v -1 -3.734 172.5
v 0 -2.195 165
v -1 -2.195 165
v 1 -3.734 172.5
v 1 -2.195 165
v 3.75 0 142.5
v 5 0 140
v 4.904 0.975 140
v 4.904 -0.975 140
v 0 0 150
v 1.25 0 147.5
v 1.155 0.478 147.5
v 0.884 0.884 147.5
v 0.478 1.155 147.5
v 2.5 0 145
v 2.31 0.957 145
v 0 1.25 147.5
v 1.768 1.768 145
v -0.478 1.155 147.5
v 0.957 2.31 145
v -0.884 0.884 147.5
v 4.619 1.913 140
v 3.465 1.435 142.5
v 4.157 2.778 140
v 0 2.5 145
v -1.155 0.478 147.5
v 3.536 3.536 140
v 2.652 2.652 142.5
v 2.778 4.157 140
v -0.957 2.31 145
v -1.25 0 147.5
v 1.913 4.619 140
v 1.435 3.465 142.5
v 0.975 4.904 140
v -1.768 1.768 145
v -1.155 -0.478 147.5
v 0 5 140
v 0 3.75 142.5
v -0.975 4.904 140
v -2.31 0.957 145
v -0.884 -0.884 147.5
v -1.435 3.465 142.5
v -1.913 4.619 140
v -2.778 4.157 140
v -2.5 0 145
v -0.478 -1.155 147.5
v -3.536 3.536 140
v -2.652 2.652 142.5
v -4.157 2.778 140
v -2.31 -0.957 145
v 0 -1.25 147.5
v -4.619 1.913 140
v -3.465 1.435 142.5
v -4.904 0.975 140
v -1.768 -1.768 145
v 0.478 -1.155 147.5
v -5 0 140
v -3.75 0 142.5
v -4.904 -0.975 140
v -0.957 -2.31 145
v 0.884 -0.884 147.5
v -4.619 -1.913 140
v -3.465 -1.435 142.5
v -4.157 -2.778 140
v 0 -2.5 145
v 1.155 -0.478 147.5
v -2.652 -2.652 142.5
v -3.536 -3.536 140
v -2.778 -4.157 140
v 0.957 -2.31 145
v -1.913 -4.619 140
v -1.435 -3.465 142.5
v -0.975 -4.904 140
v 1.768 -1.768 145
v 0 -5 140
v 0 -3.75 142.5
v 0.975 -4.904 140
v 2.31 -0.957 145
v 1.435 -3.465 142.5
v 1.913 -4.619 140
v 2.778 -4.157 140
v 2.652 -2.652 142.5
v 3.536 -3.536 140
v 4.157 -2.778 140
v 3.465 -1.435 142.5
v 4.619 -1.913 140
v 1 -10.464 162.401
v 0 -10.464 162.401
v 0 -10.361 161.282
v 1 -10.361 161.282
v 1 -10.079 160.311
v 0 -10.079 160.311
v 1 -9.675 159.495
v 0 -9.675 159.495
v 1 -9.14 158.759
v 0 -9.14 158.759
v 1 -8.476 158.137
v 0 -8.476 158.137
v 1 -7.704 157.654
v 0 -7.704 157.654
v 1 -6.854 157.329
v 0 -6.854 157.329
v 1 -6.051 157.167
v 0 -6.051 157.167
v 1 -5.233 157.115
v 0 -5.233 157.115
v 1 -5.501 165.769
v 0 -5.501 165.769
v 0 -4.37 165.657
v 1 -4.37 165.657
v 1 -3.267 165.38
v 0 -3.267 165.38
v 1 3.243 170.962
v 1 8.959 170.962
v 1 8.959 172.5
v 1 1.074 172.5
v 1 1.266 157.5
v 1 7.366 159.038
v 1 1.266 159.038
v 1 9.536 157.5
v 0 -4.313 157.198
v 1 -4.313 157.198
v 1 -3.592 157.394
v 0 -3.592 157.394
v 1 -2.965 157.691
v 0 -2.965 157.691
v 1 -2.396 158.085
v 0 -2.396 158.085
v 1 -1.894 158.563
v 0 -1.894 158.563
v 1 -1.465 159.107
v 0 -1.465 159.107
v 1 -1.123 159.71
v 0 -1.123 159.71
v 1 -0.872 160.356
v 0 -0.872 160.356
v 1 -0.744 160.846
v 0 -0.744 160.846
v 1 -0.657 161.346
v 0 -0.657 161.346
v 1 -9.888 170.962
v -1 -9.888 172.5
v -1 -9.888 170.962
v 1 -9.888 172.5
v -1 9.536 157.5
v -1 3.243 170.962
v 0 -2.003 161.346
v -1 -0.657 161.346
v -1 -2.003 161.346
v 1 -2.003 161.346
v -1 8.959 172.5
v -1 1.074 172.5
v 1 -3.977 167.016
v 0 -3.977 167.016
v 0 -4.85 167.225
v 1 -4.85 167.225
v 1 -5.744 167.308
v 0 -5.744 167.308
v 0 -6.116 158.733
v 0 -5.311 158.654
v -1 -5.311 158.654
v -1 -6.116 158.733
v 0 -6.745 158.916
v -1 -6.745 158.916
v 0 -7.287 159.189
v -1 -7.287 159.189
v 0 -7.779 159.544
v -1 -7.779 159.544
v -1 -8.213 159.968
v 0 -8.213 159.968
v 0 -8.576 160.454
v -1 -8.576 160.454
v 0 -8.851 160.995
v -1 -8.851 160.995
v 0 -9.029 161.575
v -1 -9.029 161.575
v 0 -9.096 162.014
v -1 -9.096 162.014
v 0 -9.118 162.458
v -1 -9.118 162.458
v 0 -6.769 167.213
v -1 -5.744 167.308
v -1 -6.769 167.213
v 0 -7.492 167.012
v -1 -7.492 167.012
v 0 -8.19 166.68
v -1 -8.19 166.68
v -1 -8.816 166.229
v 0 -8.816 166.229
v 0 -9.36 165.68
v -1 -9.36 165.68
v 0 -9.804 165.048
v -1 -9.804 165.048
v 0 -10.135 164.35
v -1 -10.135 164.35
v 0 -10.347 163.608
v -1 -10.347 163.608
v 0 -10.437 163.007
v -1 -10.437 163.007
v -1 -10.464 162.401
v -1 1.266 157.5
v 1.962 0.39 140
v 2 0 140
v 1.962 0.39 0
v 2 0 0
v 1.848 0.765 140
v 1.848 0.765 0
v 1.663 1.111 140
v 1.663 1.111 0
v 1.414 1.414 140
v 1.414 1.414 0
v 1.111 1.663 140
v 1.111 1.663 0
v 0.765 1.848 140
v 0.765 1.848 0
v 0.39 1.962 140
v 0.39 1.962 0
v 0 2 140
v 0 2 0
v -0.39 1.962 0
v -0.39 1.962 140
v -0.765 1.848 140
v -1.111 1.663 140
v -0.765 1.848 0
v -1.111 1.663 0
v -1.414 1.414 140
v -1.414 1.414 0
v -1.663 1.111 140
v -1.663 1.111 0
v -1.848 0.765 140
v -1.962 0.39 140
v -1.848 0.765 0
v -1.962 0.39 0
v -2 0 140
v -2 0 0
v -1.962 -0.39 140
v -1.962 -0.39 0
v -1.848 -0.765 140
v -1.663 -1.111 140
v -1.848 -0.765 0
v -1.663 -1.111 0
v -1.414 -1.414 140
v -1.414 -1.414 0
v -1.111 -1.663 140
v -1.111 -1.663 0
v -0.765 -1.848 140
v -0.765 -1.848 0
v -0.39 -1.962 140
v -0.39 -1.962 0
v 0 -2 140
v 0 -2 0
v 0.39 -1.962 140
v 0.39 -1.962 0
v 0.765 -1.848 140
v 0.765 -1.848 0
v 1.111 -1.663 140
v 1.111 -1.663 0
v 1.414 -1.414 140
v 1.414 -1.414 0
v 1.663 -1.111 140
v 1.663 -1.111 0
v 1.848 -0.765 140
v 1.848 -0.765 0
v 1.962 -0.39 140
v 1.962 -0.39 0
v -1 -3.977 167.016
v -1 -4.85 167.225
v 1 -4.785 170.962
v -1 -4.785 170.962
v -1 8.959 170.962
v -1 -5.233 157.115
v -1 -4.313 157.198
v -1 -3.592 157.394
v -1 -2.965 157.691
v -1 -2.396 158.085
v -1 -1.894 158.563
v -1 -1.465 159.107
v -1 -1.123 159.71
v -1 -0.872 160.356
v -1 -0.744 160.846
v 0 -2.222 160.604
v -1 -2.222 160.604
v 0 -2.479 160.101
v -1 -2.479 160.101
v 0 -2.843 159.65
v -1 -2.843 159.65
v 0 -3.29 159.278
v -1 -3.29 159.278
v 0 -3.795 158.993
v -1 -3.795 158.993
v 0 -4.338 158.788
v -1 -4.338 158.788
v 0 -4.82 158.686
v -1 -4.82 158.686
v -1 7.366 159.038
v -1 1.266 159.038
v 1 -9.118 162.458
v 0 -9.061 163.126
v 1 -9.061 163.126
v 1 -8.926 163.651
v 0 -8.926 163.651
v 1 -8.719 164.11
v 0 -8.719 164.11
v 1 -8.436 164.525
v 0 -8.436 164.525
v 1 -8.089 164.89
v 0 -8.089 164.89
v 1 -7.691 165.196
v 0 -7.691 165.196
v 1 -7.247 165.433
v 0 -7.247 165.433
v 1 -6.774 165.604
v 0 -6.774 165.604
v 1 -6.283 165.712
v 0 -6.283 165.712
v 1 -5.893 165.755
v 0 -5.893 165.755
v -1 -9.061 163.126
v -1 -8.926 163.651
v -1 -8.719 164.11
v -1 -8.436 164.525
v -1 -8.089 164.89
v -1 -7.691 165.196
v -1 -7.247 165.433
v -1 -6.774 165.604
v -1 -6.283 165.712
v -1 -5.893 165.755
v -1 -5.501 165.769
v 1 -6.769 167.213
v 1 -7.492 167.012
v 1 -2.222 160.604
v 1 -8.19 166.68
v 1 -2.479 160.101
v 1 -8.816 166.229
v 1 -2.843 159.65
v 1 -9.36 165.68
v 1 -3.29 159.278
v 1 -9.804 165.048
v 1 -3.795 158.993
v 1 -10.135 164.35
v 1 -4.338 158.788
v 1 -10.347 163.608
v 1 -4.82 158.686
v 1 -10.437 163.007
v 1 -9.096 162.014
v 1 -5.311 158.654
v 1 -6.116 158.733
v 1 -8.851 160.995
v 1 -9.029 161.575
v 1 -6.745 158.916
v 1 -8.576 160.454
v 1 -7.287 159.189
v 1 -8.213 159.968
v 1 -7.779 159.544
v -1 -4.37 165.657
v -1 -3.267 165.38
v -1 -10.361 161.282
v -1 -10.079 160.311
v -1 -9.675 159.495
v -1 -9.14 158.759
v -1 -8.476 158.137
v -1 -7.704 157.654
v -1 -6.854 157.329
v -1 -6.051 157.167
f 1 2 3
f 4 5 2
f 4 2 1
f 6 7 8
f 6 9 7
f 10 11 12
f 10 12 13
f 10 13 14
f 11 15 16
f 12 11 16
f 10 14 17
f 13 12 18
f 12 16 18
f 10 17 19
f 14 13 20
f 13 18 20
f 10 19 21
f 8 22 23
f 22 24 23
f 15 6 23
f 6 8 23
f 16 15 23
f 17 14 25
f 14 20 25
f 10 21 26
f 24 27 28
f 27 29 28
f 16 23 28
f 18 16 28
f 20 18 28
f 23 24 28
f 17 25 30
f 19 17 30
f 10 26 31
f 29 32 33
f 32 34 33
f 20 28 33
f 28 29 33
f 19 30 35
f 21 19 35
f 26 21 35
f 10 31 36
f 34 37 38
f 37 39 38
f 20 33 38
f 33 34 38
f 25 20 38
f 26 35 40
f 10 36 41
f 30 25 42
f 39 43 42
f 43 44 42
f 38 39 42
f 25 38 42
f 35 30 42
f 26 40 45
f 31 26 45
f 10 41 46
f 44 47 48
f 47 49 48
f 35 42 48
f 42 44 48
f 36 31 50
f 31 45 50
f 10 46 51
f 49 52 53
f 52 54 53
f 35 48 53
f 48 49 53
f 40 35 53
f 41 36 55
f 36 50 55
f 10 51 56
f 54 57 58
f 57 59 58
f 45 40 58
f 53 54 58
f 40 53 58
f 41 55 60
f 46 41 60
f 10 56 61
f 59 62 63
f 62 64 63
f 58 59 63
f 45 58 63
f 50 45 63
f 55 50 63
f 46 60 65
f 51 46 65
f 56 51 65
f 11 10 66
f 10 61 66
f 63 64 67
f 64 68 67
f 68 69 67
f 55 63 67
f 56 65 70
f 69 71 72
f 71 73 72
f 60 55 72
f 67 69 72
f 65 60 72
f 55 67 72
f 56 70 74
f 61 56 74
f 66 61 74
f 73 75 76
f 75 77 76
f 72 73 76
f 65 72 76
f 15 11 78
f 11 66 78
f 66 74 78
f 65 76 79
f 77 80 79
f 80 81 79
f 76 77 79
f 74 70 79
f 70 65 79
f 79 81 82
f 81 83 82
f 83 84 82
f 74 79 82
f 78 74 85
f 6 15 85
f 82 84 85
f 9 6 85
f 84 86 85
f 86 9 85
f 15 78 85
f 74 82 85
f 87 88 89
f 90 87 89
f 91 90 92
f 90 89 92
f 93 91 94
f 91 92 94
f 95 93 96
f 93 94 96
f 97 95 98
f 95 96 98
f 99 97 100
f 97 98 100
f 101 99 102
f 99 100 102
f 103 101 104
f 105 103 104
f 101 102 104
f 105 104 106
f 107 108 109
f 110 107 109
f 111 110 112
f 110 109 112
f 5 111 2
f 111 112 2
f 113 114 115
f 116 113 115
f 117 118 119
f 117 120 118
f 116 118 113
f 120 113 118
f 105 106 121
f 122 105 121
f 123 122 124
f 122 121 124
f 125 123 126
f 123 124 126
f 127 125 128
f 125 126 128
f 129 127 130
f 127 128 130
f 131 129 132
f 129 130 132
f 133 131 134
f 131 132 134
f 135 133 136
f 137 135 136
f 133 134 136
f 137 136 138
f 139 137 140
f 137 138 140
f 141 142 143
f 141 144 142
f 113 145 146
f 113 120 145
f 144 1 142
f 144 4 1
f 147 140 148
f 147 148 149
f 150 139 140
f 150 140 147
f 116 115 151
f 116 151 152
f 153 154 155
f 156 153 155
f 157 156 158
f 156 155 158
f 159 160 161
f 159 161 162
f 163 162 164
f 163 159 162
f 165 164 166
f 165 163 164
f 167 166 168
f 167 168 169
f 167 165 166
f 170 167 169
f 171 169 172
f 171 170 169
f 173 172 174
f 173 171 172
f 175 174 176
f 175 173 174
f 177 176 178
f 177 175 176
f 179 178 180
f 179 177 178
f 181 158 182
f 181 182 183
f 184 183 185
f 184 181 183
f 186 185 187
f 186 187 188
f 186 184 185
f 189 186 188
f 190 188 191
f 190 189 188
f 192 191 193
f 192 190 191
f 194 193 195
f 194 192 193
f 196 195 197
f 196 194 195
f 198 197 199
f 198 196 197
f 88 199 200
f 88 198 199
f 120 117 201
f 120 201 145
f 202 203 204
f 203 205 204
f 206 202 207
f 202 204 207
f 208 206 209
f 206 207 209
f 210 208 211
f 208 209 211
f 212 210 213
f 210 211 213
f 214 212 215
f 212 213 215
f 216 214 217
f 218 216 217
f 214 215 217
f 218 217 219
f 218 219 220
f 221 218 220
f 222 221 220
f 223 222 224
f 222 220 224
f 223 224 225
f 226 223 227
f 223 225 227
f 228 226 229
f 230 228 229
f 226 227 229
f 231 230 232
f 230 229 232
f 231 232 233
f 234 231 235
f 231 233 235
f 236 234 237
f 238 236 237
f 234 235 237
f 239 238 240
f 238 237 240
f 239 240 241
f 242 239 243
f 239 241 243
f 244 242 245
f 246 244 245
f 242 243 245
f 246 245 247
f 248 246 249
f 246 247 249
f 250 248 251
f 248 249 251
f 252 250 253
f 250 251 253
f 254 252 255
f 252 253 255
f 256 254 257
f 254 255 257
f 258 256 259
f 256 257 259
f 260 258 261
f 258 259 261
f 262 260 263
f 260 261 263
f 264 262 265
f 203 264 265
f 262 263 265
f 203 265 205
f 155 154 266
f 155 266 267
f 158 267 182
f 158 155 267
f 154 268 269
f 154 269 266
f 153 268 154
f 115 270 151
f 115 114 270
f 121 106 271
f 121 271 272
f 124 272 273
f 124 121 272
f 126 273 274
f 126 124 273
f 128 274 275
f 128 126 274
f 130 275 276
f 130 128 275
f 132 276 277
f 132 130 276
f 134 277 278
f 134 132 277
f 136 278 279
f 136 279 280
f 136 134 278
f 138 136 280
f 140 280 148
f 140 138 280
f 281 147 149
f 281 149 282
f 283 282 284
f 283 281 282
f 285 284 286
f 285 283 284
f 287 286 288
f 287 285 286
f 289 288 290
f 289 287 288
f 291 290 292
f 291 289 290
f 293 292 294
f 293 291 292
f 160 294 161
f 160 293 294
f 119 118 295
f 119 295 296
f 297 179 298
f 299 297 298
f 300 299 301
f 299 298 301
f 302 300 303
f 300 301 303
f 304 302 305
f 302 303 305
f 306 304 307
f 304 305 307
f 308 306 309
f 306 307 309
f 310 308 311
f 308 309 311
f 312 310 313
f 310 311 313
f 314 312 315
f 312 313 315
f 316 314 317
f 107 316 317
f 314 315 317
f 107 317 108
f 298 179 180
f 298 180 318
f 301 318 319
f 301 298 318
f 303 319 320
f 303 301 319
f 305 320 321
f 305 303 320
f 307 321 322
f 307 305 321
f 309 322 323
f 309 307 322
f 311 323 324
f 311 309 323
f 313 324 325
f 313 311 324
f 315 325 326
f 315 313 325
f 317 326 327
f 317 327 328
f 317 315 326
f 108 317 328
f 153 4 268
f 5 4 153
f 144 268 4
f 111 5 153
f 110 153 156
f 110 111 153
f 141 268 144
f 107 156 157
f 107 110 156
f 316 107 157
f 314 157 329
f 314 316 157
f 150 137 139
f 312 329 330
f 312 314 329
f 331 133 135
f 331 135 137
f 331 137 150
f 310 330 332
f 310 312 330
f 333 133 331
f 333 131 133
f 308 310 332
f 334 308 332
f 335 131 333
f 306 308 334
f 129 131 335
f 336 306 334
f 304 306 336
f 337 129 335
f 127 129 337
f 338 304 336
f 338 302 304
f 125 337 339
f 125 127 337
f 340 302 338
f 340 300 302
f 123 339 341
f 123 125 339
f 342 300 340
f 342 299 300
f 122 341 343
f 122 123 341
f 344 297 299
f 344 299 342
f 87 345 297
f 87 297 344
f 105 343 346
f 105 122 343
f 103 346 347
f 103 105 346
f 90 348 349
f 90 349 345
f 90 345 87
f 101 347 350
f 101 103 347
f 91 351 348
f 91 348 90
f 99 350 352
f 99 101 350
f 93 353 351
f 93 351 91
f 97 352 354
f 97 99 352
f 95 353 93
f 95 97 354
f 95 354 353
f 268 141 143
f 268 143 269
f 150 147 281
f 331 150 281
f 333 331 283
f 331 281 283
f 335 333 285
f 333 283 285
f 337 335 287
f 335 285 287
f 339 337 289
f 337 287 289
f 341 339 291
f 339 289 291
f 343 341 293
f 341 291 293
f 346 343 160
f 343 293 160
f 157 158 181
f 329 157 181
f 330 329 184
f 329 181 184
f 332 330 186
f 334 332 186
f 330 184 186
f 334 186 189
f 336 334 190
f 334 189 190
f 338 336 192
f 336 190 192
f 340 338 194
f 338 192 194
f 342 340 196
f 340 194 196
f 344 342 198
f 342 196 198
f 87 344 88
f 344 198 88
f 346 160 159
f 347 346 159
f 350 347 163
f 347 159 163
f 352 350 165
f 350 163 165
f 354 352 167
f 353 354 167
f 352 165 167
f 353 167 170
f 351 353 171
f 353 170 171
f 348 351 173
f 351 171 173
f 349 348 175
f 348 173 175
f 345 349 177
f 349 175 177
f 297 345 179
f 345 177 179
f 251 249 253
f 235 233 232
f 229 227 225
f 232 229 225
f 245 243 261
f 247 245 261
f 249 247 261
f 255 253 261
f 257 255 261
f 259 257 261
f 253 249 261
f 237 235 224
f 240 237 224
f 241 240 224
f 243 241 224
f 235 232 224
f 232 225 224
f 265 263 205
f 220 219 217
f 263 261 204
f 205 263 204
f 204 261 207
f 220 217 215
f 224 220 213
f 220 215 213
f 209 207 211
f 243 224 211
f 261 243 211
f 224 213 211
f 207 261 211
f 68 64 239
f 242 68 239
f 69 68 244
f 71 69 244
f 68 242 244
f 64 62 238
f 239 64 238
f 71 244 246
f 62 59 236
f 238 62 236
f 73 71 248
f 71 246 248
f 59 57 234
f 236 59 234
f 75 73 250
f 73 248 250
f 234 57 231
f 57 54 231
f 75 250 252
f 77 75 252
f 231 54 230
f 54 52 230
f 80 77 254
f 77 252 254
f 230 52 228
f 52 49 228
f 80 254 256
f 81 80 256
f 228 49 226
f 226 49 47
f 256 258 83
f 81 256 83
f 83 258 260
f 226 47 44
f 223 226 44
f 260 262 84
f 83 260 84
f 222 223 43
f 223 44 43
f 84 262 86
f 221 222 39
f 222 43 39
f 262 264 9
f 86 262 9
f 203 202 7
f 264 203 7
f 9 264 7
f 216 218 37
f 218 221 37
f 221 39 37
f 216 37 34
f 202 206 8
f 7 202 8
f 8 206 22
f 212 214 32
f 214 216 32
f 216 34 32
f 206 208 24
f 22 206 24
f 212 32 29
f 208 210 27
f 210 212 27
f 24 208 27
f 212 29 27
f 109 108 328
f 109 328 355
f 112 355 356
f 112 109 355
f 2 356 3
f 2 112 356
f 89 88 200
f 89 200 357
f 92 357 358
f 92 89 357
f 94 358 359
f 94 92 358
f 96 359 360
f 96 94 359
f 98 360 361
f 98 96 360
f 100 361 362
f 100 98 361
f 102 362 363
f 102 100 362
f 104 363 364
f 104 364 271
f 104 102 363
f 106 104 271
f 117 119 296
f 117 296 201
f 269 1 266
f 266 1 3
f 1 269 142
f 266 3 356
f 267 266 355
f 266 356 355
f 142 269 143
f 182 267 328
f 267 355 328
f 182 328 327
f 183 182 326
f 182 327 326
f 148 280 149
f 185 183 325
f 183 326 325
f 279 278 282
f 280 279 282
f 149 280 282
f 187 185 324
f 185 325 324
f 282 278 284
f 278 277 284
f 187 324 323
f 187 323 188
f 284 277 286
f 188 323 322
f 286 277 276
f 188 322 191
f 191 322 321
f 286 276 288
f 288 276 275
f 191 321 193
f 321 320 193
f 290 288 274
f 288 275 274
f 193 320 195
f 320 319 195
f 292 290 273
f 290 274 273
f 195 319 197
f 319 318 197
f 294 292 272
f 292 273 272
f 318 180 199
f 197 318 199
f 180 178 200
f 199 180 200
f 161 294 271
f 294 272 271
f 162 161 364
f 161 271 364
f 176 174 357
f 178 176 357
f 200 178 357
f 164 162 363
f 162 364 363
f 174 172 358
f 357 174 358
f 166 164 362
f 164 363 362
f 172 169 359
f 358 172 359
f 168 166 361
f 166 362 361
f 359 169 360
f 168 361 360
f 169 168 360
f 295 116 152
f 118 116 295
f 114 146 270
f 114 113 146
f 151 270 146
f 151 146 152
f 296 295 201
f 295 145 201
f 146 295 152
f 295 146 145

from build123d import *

# Parameters (mm, degrees)
BOSS_EXTRUDE1_DEPTH        = 1
BOSS_EXTRUDE1_DEPTH_BACK   = 1
BOSS_EXTRUDE1_2_DEPTH      = 1
BOSS_EXTRUDE1_2_DEPTH_BACK = 1


with BuildPart() as part:
    # Sketch2 → Revolve1 (revolve)
    with BuildSketch(Plane(origin=(0, 0, 0), x_dir=(1, 0, 0), z_dir=(0, 1, 0))):
        Polygon((0, -150), (5, -140), (2, -140), (2, 0), (0, 0), align=None)
    revolve(axis=Axis((0, 0, -41.949952025), (0, 0, 1)))


with BuildPart() as body_2:
    # Sketch3 → Boss-Extrude1 (new, two sides: drawn at the far end of the back side and taken through both)
    with BuildSketch(Plane(origin=(0, 0, 0), x_dir=(0, -1, 0), z_dir=(1, 0, 0)).offset(-BOSS_EXTRUDE1_DEPTH_BACK)):
        Polygon((-8.958586521, -170.961538462), (-8.958586521, -172.5), (-1.073971137, -172.5), (-7.366038444, -159.038461538), (-1.266278829, -159.038461538), (-1.266278829, -157.5), (-9.535509598, -157.5), (-3.243442291, -170.961538462), align=None)
    extrude(amount=BOSS_EXTRUDE1_DEPTH + BOSS_EXTRUDE1_DEPTH_BACK)


with BuildPart() as body_3:
    # Sketch3 → Boss-Extrude1 2 (new, two sides: drawn at the far end of the back side and taken through both)
    with BuildSketch(Plane(origin=(0, 0, 0), x_dir=(0, -1, 0), z_dir=(1, 0, 0)).offset(-BOSS_EXTRUDE1_2_DEPTH_BACK)):
        with BuildLine():
            Line((9.887567325, -172.5), (9.887567325, -170.961538462))
            Line((9.887567325, -170.961538462), (4.785403863, -170.961538462))
            Line((4.785403863, -170.961538462), (3.977110594, -167.016225962))
            add(Edge.make_bspline(
                [(3.977110594, -167.016225962), (4.135921484, -167.060069984), (4.443592466, -167.145010842), (4.897706156, -167.239321287), (5.3288156, -167.29617319), (5.608567187, -167.303935949), (5.743937517, -167.307692308)],
                knots=[0, 0, 0, 0, 1.100273476, 2.13160584, 3.095893838, 4, 4, 4, 4], degree=3))
            add(Edge.make_bspline(
                [(5.743937517, -167.307692308), (5.911469427, -167.304185649), (6.24087902, -167.297290681), (6.722105689, -167.227184909), (7.183764435, -167.125573837), (7.619214914, -166.969276616), (8.035477483, -166.777179721), (8.426908648, -166.538369816), (8.795347102, -166.256249819), (9.139987498, -165.936607073), (9.450692918, -165.58071989), (9.721766713, -165.197753494), (9.953469806, -164.791981219), (10.13830025, -164.359670651), (10.288157328, -163.904895851), (10.387242998, -163.423840767), (10.453352538, -162.920507804), (10.460728922, -162.57634312), (10.464490402, -162.400841346)],
                knots=[0, 0, 0, 0, 1.052656913, 2.069786496, 3.052102726, 4.020122636, 4.972424848, 5.930457368, 6.896570172, 7.885826804, 8.881139003, 9.861434336, 10.831623367, 11.813212553, 12.812997731, 13.836986694, 14.897002833, 16, 16, 16, 16], degree=3))
            add(Edge.make_bspline(
                [(10.464490402, -162.400841346), (10.461637896, -162.278603862), (10.455971432, -162.035780828), (10.4272095, -161.675153979), (10.371651619, -161.322203317), (10.297859754, -160.977627952), (10.199737382, -160.640913658), (10.083702808, -160.311265984), (9.94481725, -159.989230296), (9.78632982, -159.676409009), (9.606012689, -159.378959247), (9.41357379, -159.093415078), (9.203882177, -158.828060432), (8.980608649, -158.578459857), (8.739466144, -158.351792308), (8.486372312, -158.13860225), (8.215667474, -157.947932487), (7.932123942, -157.772571018), (7.635940617, -157.615556084), (7.324108821, -157.484578375), (7.003475543, -157.36977506), (6.671182611, -157.276416452), (6.327873889, -157.203983651), (5.972367137, -157.1546579), (5.606446231, -157.118769123), (5.358410975, -157.116520479), (5.233120209, -157.115384615)],
                knots=[0, 0, 0, 0, 1.056281413, 2.098288097, 3.122646807, 4.141030392, 5.140675379, 6.150604744, 7.15845591, 8.168533554, 9.177684096, 10.161739049, 11.141561652, 12.097360316, 13.052218386, 13.998410789, 14.954052752, 15.909851415, 16.877523809, 17.846742625, 18.829312613, 19.818263486, 20.826374662, 21.858017533, 22.918014209, 24, 24, 24, 24], degree=3))
            add(Edge.make_bspline(
                [(5.233120209, -157.115384615), (5.083663432, -157.118353573), (4.789624879, -157.124194647), (4.358765469, -157.185013786), (3.944482382, -157.272715803), (3.548493848, -157.402581355), (3.17266208, -157.572879113), (2.811535272, -157.773917029), (2.471723833, -158.016561831), (2.150816973, -158.292114808), (1.856439093, -158.597737608), (1.585431088, -158.922660627), (1.350772111, -159.274090548), (1.146876605, -159.646164401), (0.973427436, -160.03985218), (0.837046103, -160.456067664), (0.72700461, -160.892789077), (0.680445908, -161.193445999), (0.656798094, -161.346153846)],
                knots=[0, 0, 0, 0, 1.04695683, 2.059763882, 3.044413726, 4.012427942, 4.974081556, 5.932886124, 6.904940154, 7.895678616, 8.893654631, 9.876199664, 10.857615262, 11.850515636, 12.847107701, 13.868396357, 14.917328757, 16, 16, 16, 16], degree=3))
            Line((0.656798094, -161.346153846), (2.00295194, -161.346153846))
            add(Edge.make_bspline(
                [(2.00295194, -161.346153846), (2.036032743, -161.203083199), (2.099615882, -160.928093472), (2.23990822, -160.542198326), (2.408726247, -160.196889026), (2.618776332, -159.894337129), (2.857370729, -159.624358707), (3.132747288, -159.384274178), (3.442565873, -159.170288137), (3.786895688, -158.990462771), (4.151090117, -158.839207909), (4.530034101, -158.731213569), (4.918346783, -158.665854967), (5.179786156, -158.657864157), (5.311245209, -158.653846154)],
                knots=[0, 0, 0, 0, 1.136370375, 2.184166959, 3.172867797, 4.104539607, 5.027679118, 5.956634301, 6.927059835, 7.936867459, 8.959641981, 9.976160943, 10.98235693, 12, 12, 12, 12], degree=3))
            add(Edge.make_bspline(
                [(5.311245209, -158.653846154), (5.439627651, -158.657393206), (5.692413729, -158.66437738), (6.064618753, -158.717265273), (6.422918413, -158.800858252), (6.767948739, -158.917967227), (7.098014319, -159.072895535), (7.412648474, -159.263216032), (7.716333445, -159.484180393), (8.0010767, -159.736734594), (8.26180345, -160.01520754), (8.49219042, -160.312959591), (8.684090536, -160.630605369), (8.845808395, -160.962632597), (8.96860818, -161.31268371), (9.056212403, -161.679117276), (9.107654079, -162.062838631), (9.114730565, -162.324564243), (9.118336556, -162.457932692)],
                knots=[0, 0, 0, 0, 1.027268864, 2.022700798, 3.002744649, 3.968653148, 4.933396556, 5.915045722, 6.907600446, 7.935526002, 8.956456544, 9.95700807, 10.942805781, 11.92166854, 12.907987664, 13.905483474, 14.932689774, 16, 16, 16, 16], degree=3))
            add(Edge.make_bspline(
                [(9.118336556, -162.457932692), (9.11605731, -162.578344541), (9.111612247, -162.813175926), (9.059043658, -163.156423063), (8.98823791, -163.484071376), (8.876564493, -163.793059521), (8.740921344, -164.086613326), (8.564183938, -164.357479425), (8.36878926, -164.618902079), (8.134790794, -164.853598193), (7.88142437, -165.072021918), (7.600648632, -165.257275951), (7.300487573, -165.414892638), (6.980241671, -165.54401236), (6.639555436, -165.646871335), (6.27823456, -165.71795725), (5.896199729, -165.760494324), (5.634875518, -165.766264664), (5.500548094, -165.769230769)],
                knots=[0, 0, 0, 0, 1.045820996, 2.039596555, 3.013371638, 3.9552447, 4.890047302, 5.817684688, 6.761648481, 7.722253242, 8.692244539, 9.66551337, 10.63924952, 11.635311376, 12.662847378, 13.728455105, 14.832366986, 16, 16, 16, 16], degree=3))
            add(Edge.make_bspline(
                [(5.500548094, -165.769230769), (5.383271567, -165.766827016), (5.14318831, -165.76190616), (4.774060713, -165.723180046), (4.387850998, -165.663603645), (3.983059776, -165.57773504), (3.560797928, -165.470221633), (3.120363225, -165.335950868), (2.661745026, -165.18128788), (2.353062139, -165.061325997), (2.195259633, -165)],
                knots=[0, 0, 0, 0, 0.824638674, 1.688163388, 2.607705698, 3.571998603, 4.597075385, 5.671199175, 6.809488238, 8, 8, 8, 8], degree=3))
            Line((2.195259633, -165), (3.733721171, -172.5))
            Line((3.733721171, -172.5), (9.887567325, -172.5))
        make_face()
    extrude(amount=BOSS_EXTRUDE1_2_DEPTH + BOSS_EXTRUDE1_2_DEPTH_BACK)


solid = Compound([part.part, body_2.part, body_3.part])
